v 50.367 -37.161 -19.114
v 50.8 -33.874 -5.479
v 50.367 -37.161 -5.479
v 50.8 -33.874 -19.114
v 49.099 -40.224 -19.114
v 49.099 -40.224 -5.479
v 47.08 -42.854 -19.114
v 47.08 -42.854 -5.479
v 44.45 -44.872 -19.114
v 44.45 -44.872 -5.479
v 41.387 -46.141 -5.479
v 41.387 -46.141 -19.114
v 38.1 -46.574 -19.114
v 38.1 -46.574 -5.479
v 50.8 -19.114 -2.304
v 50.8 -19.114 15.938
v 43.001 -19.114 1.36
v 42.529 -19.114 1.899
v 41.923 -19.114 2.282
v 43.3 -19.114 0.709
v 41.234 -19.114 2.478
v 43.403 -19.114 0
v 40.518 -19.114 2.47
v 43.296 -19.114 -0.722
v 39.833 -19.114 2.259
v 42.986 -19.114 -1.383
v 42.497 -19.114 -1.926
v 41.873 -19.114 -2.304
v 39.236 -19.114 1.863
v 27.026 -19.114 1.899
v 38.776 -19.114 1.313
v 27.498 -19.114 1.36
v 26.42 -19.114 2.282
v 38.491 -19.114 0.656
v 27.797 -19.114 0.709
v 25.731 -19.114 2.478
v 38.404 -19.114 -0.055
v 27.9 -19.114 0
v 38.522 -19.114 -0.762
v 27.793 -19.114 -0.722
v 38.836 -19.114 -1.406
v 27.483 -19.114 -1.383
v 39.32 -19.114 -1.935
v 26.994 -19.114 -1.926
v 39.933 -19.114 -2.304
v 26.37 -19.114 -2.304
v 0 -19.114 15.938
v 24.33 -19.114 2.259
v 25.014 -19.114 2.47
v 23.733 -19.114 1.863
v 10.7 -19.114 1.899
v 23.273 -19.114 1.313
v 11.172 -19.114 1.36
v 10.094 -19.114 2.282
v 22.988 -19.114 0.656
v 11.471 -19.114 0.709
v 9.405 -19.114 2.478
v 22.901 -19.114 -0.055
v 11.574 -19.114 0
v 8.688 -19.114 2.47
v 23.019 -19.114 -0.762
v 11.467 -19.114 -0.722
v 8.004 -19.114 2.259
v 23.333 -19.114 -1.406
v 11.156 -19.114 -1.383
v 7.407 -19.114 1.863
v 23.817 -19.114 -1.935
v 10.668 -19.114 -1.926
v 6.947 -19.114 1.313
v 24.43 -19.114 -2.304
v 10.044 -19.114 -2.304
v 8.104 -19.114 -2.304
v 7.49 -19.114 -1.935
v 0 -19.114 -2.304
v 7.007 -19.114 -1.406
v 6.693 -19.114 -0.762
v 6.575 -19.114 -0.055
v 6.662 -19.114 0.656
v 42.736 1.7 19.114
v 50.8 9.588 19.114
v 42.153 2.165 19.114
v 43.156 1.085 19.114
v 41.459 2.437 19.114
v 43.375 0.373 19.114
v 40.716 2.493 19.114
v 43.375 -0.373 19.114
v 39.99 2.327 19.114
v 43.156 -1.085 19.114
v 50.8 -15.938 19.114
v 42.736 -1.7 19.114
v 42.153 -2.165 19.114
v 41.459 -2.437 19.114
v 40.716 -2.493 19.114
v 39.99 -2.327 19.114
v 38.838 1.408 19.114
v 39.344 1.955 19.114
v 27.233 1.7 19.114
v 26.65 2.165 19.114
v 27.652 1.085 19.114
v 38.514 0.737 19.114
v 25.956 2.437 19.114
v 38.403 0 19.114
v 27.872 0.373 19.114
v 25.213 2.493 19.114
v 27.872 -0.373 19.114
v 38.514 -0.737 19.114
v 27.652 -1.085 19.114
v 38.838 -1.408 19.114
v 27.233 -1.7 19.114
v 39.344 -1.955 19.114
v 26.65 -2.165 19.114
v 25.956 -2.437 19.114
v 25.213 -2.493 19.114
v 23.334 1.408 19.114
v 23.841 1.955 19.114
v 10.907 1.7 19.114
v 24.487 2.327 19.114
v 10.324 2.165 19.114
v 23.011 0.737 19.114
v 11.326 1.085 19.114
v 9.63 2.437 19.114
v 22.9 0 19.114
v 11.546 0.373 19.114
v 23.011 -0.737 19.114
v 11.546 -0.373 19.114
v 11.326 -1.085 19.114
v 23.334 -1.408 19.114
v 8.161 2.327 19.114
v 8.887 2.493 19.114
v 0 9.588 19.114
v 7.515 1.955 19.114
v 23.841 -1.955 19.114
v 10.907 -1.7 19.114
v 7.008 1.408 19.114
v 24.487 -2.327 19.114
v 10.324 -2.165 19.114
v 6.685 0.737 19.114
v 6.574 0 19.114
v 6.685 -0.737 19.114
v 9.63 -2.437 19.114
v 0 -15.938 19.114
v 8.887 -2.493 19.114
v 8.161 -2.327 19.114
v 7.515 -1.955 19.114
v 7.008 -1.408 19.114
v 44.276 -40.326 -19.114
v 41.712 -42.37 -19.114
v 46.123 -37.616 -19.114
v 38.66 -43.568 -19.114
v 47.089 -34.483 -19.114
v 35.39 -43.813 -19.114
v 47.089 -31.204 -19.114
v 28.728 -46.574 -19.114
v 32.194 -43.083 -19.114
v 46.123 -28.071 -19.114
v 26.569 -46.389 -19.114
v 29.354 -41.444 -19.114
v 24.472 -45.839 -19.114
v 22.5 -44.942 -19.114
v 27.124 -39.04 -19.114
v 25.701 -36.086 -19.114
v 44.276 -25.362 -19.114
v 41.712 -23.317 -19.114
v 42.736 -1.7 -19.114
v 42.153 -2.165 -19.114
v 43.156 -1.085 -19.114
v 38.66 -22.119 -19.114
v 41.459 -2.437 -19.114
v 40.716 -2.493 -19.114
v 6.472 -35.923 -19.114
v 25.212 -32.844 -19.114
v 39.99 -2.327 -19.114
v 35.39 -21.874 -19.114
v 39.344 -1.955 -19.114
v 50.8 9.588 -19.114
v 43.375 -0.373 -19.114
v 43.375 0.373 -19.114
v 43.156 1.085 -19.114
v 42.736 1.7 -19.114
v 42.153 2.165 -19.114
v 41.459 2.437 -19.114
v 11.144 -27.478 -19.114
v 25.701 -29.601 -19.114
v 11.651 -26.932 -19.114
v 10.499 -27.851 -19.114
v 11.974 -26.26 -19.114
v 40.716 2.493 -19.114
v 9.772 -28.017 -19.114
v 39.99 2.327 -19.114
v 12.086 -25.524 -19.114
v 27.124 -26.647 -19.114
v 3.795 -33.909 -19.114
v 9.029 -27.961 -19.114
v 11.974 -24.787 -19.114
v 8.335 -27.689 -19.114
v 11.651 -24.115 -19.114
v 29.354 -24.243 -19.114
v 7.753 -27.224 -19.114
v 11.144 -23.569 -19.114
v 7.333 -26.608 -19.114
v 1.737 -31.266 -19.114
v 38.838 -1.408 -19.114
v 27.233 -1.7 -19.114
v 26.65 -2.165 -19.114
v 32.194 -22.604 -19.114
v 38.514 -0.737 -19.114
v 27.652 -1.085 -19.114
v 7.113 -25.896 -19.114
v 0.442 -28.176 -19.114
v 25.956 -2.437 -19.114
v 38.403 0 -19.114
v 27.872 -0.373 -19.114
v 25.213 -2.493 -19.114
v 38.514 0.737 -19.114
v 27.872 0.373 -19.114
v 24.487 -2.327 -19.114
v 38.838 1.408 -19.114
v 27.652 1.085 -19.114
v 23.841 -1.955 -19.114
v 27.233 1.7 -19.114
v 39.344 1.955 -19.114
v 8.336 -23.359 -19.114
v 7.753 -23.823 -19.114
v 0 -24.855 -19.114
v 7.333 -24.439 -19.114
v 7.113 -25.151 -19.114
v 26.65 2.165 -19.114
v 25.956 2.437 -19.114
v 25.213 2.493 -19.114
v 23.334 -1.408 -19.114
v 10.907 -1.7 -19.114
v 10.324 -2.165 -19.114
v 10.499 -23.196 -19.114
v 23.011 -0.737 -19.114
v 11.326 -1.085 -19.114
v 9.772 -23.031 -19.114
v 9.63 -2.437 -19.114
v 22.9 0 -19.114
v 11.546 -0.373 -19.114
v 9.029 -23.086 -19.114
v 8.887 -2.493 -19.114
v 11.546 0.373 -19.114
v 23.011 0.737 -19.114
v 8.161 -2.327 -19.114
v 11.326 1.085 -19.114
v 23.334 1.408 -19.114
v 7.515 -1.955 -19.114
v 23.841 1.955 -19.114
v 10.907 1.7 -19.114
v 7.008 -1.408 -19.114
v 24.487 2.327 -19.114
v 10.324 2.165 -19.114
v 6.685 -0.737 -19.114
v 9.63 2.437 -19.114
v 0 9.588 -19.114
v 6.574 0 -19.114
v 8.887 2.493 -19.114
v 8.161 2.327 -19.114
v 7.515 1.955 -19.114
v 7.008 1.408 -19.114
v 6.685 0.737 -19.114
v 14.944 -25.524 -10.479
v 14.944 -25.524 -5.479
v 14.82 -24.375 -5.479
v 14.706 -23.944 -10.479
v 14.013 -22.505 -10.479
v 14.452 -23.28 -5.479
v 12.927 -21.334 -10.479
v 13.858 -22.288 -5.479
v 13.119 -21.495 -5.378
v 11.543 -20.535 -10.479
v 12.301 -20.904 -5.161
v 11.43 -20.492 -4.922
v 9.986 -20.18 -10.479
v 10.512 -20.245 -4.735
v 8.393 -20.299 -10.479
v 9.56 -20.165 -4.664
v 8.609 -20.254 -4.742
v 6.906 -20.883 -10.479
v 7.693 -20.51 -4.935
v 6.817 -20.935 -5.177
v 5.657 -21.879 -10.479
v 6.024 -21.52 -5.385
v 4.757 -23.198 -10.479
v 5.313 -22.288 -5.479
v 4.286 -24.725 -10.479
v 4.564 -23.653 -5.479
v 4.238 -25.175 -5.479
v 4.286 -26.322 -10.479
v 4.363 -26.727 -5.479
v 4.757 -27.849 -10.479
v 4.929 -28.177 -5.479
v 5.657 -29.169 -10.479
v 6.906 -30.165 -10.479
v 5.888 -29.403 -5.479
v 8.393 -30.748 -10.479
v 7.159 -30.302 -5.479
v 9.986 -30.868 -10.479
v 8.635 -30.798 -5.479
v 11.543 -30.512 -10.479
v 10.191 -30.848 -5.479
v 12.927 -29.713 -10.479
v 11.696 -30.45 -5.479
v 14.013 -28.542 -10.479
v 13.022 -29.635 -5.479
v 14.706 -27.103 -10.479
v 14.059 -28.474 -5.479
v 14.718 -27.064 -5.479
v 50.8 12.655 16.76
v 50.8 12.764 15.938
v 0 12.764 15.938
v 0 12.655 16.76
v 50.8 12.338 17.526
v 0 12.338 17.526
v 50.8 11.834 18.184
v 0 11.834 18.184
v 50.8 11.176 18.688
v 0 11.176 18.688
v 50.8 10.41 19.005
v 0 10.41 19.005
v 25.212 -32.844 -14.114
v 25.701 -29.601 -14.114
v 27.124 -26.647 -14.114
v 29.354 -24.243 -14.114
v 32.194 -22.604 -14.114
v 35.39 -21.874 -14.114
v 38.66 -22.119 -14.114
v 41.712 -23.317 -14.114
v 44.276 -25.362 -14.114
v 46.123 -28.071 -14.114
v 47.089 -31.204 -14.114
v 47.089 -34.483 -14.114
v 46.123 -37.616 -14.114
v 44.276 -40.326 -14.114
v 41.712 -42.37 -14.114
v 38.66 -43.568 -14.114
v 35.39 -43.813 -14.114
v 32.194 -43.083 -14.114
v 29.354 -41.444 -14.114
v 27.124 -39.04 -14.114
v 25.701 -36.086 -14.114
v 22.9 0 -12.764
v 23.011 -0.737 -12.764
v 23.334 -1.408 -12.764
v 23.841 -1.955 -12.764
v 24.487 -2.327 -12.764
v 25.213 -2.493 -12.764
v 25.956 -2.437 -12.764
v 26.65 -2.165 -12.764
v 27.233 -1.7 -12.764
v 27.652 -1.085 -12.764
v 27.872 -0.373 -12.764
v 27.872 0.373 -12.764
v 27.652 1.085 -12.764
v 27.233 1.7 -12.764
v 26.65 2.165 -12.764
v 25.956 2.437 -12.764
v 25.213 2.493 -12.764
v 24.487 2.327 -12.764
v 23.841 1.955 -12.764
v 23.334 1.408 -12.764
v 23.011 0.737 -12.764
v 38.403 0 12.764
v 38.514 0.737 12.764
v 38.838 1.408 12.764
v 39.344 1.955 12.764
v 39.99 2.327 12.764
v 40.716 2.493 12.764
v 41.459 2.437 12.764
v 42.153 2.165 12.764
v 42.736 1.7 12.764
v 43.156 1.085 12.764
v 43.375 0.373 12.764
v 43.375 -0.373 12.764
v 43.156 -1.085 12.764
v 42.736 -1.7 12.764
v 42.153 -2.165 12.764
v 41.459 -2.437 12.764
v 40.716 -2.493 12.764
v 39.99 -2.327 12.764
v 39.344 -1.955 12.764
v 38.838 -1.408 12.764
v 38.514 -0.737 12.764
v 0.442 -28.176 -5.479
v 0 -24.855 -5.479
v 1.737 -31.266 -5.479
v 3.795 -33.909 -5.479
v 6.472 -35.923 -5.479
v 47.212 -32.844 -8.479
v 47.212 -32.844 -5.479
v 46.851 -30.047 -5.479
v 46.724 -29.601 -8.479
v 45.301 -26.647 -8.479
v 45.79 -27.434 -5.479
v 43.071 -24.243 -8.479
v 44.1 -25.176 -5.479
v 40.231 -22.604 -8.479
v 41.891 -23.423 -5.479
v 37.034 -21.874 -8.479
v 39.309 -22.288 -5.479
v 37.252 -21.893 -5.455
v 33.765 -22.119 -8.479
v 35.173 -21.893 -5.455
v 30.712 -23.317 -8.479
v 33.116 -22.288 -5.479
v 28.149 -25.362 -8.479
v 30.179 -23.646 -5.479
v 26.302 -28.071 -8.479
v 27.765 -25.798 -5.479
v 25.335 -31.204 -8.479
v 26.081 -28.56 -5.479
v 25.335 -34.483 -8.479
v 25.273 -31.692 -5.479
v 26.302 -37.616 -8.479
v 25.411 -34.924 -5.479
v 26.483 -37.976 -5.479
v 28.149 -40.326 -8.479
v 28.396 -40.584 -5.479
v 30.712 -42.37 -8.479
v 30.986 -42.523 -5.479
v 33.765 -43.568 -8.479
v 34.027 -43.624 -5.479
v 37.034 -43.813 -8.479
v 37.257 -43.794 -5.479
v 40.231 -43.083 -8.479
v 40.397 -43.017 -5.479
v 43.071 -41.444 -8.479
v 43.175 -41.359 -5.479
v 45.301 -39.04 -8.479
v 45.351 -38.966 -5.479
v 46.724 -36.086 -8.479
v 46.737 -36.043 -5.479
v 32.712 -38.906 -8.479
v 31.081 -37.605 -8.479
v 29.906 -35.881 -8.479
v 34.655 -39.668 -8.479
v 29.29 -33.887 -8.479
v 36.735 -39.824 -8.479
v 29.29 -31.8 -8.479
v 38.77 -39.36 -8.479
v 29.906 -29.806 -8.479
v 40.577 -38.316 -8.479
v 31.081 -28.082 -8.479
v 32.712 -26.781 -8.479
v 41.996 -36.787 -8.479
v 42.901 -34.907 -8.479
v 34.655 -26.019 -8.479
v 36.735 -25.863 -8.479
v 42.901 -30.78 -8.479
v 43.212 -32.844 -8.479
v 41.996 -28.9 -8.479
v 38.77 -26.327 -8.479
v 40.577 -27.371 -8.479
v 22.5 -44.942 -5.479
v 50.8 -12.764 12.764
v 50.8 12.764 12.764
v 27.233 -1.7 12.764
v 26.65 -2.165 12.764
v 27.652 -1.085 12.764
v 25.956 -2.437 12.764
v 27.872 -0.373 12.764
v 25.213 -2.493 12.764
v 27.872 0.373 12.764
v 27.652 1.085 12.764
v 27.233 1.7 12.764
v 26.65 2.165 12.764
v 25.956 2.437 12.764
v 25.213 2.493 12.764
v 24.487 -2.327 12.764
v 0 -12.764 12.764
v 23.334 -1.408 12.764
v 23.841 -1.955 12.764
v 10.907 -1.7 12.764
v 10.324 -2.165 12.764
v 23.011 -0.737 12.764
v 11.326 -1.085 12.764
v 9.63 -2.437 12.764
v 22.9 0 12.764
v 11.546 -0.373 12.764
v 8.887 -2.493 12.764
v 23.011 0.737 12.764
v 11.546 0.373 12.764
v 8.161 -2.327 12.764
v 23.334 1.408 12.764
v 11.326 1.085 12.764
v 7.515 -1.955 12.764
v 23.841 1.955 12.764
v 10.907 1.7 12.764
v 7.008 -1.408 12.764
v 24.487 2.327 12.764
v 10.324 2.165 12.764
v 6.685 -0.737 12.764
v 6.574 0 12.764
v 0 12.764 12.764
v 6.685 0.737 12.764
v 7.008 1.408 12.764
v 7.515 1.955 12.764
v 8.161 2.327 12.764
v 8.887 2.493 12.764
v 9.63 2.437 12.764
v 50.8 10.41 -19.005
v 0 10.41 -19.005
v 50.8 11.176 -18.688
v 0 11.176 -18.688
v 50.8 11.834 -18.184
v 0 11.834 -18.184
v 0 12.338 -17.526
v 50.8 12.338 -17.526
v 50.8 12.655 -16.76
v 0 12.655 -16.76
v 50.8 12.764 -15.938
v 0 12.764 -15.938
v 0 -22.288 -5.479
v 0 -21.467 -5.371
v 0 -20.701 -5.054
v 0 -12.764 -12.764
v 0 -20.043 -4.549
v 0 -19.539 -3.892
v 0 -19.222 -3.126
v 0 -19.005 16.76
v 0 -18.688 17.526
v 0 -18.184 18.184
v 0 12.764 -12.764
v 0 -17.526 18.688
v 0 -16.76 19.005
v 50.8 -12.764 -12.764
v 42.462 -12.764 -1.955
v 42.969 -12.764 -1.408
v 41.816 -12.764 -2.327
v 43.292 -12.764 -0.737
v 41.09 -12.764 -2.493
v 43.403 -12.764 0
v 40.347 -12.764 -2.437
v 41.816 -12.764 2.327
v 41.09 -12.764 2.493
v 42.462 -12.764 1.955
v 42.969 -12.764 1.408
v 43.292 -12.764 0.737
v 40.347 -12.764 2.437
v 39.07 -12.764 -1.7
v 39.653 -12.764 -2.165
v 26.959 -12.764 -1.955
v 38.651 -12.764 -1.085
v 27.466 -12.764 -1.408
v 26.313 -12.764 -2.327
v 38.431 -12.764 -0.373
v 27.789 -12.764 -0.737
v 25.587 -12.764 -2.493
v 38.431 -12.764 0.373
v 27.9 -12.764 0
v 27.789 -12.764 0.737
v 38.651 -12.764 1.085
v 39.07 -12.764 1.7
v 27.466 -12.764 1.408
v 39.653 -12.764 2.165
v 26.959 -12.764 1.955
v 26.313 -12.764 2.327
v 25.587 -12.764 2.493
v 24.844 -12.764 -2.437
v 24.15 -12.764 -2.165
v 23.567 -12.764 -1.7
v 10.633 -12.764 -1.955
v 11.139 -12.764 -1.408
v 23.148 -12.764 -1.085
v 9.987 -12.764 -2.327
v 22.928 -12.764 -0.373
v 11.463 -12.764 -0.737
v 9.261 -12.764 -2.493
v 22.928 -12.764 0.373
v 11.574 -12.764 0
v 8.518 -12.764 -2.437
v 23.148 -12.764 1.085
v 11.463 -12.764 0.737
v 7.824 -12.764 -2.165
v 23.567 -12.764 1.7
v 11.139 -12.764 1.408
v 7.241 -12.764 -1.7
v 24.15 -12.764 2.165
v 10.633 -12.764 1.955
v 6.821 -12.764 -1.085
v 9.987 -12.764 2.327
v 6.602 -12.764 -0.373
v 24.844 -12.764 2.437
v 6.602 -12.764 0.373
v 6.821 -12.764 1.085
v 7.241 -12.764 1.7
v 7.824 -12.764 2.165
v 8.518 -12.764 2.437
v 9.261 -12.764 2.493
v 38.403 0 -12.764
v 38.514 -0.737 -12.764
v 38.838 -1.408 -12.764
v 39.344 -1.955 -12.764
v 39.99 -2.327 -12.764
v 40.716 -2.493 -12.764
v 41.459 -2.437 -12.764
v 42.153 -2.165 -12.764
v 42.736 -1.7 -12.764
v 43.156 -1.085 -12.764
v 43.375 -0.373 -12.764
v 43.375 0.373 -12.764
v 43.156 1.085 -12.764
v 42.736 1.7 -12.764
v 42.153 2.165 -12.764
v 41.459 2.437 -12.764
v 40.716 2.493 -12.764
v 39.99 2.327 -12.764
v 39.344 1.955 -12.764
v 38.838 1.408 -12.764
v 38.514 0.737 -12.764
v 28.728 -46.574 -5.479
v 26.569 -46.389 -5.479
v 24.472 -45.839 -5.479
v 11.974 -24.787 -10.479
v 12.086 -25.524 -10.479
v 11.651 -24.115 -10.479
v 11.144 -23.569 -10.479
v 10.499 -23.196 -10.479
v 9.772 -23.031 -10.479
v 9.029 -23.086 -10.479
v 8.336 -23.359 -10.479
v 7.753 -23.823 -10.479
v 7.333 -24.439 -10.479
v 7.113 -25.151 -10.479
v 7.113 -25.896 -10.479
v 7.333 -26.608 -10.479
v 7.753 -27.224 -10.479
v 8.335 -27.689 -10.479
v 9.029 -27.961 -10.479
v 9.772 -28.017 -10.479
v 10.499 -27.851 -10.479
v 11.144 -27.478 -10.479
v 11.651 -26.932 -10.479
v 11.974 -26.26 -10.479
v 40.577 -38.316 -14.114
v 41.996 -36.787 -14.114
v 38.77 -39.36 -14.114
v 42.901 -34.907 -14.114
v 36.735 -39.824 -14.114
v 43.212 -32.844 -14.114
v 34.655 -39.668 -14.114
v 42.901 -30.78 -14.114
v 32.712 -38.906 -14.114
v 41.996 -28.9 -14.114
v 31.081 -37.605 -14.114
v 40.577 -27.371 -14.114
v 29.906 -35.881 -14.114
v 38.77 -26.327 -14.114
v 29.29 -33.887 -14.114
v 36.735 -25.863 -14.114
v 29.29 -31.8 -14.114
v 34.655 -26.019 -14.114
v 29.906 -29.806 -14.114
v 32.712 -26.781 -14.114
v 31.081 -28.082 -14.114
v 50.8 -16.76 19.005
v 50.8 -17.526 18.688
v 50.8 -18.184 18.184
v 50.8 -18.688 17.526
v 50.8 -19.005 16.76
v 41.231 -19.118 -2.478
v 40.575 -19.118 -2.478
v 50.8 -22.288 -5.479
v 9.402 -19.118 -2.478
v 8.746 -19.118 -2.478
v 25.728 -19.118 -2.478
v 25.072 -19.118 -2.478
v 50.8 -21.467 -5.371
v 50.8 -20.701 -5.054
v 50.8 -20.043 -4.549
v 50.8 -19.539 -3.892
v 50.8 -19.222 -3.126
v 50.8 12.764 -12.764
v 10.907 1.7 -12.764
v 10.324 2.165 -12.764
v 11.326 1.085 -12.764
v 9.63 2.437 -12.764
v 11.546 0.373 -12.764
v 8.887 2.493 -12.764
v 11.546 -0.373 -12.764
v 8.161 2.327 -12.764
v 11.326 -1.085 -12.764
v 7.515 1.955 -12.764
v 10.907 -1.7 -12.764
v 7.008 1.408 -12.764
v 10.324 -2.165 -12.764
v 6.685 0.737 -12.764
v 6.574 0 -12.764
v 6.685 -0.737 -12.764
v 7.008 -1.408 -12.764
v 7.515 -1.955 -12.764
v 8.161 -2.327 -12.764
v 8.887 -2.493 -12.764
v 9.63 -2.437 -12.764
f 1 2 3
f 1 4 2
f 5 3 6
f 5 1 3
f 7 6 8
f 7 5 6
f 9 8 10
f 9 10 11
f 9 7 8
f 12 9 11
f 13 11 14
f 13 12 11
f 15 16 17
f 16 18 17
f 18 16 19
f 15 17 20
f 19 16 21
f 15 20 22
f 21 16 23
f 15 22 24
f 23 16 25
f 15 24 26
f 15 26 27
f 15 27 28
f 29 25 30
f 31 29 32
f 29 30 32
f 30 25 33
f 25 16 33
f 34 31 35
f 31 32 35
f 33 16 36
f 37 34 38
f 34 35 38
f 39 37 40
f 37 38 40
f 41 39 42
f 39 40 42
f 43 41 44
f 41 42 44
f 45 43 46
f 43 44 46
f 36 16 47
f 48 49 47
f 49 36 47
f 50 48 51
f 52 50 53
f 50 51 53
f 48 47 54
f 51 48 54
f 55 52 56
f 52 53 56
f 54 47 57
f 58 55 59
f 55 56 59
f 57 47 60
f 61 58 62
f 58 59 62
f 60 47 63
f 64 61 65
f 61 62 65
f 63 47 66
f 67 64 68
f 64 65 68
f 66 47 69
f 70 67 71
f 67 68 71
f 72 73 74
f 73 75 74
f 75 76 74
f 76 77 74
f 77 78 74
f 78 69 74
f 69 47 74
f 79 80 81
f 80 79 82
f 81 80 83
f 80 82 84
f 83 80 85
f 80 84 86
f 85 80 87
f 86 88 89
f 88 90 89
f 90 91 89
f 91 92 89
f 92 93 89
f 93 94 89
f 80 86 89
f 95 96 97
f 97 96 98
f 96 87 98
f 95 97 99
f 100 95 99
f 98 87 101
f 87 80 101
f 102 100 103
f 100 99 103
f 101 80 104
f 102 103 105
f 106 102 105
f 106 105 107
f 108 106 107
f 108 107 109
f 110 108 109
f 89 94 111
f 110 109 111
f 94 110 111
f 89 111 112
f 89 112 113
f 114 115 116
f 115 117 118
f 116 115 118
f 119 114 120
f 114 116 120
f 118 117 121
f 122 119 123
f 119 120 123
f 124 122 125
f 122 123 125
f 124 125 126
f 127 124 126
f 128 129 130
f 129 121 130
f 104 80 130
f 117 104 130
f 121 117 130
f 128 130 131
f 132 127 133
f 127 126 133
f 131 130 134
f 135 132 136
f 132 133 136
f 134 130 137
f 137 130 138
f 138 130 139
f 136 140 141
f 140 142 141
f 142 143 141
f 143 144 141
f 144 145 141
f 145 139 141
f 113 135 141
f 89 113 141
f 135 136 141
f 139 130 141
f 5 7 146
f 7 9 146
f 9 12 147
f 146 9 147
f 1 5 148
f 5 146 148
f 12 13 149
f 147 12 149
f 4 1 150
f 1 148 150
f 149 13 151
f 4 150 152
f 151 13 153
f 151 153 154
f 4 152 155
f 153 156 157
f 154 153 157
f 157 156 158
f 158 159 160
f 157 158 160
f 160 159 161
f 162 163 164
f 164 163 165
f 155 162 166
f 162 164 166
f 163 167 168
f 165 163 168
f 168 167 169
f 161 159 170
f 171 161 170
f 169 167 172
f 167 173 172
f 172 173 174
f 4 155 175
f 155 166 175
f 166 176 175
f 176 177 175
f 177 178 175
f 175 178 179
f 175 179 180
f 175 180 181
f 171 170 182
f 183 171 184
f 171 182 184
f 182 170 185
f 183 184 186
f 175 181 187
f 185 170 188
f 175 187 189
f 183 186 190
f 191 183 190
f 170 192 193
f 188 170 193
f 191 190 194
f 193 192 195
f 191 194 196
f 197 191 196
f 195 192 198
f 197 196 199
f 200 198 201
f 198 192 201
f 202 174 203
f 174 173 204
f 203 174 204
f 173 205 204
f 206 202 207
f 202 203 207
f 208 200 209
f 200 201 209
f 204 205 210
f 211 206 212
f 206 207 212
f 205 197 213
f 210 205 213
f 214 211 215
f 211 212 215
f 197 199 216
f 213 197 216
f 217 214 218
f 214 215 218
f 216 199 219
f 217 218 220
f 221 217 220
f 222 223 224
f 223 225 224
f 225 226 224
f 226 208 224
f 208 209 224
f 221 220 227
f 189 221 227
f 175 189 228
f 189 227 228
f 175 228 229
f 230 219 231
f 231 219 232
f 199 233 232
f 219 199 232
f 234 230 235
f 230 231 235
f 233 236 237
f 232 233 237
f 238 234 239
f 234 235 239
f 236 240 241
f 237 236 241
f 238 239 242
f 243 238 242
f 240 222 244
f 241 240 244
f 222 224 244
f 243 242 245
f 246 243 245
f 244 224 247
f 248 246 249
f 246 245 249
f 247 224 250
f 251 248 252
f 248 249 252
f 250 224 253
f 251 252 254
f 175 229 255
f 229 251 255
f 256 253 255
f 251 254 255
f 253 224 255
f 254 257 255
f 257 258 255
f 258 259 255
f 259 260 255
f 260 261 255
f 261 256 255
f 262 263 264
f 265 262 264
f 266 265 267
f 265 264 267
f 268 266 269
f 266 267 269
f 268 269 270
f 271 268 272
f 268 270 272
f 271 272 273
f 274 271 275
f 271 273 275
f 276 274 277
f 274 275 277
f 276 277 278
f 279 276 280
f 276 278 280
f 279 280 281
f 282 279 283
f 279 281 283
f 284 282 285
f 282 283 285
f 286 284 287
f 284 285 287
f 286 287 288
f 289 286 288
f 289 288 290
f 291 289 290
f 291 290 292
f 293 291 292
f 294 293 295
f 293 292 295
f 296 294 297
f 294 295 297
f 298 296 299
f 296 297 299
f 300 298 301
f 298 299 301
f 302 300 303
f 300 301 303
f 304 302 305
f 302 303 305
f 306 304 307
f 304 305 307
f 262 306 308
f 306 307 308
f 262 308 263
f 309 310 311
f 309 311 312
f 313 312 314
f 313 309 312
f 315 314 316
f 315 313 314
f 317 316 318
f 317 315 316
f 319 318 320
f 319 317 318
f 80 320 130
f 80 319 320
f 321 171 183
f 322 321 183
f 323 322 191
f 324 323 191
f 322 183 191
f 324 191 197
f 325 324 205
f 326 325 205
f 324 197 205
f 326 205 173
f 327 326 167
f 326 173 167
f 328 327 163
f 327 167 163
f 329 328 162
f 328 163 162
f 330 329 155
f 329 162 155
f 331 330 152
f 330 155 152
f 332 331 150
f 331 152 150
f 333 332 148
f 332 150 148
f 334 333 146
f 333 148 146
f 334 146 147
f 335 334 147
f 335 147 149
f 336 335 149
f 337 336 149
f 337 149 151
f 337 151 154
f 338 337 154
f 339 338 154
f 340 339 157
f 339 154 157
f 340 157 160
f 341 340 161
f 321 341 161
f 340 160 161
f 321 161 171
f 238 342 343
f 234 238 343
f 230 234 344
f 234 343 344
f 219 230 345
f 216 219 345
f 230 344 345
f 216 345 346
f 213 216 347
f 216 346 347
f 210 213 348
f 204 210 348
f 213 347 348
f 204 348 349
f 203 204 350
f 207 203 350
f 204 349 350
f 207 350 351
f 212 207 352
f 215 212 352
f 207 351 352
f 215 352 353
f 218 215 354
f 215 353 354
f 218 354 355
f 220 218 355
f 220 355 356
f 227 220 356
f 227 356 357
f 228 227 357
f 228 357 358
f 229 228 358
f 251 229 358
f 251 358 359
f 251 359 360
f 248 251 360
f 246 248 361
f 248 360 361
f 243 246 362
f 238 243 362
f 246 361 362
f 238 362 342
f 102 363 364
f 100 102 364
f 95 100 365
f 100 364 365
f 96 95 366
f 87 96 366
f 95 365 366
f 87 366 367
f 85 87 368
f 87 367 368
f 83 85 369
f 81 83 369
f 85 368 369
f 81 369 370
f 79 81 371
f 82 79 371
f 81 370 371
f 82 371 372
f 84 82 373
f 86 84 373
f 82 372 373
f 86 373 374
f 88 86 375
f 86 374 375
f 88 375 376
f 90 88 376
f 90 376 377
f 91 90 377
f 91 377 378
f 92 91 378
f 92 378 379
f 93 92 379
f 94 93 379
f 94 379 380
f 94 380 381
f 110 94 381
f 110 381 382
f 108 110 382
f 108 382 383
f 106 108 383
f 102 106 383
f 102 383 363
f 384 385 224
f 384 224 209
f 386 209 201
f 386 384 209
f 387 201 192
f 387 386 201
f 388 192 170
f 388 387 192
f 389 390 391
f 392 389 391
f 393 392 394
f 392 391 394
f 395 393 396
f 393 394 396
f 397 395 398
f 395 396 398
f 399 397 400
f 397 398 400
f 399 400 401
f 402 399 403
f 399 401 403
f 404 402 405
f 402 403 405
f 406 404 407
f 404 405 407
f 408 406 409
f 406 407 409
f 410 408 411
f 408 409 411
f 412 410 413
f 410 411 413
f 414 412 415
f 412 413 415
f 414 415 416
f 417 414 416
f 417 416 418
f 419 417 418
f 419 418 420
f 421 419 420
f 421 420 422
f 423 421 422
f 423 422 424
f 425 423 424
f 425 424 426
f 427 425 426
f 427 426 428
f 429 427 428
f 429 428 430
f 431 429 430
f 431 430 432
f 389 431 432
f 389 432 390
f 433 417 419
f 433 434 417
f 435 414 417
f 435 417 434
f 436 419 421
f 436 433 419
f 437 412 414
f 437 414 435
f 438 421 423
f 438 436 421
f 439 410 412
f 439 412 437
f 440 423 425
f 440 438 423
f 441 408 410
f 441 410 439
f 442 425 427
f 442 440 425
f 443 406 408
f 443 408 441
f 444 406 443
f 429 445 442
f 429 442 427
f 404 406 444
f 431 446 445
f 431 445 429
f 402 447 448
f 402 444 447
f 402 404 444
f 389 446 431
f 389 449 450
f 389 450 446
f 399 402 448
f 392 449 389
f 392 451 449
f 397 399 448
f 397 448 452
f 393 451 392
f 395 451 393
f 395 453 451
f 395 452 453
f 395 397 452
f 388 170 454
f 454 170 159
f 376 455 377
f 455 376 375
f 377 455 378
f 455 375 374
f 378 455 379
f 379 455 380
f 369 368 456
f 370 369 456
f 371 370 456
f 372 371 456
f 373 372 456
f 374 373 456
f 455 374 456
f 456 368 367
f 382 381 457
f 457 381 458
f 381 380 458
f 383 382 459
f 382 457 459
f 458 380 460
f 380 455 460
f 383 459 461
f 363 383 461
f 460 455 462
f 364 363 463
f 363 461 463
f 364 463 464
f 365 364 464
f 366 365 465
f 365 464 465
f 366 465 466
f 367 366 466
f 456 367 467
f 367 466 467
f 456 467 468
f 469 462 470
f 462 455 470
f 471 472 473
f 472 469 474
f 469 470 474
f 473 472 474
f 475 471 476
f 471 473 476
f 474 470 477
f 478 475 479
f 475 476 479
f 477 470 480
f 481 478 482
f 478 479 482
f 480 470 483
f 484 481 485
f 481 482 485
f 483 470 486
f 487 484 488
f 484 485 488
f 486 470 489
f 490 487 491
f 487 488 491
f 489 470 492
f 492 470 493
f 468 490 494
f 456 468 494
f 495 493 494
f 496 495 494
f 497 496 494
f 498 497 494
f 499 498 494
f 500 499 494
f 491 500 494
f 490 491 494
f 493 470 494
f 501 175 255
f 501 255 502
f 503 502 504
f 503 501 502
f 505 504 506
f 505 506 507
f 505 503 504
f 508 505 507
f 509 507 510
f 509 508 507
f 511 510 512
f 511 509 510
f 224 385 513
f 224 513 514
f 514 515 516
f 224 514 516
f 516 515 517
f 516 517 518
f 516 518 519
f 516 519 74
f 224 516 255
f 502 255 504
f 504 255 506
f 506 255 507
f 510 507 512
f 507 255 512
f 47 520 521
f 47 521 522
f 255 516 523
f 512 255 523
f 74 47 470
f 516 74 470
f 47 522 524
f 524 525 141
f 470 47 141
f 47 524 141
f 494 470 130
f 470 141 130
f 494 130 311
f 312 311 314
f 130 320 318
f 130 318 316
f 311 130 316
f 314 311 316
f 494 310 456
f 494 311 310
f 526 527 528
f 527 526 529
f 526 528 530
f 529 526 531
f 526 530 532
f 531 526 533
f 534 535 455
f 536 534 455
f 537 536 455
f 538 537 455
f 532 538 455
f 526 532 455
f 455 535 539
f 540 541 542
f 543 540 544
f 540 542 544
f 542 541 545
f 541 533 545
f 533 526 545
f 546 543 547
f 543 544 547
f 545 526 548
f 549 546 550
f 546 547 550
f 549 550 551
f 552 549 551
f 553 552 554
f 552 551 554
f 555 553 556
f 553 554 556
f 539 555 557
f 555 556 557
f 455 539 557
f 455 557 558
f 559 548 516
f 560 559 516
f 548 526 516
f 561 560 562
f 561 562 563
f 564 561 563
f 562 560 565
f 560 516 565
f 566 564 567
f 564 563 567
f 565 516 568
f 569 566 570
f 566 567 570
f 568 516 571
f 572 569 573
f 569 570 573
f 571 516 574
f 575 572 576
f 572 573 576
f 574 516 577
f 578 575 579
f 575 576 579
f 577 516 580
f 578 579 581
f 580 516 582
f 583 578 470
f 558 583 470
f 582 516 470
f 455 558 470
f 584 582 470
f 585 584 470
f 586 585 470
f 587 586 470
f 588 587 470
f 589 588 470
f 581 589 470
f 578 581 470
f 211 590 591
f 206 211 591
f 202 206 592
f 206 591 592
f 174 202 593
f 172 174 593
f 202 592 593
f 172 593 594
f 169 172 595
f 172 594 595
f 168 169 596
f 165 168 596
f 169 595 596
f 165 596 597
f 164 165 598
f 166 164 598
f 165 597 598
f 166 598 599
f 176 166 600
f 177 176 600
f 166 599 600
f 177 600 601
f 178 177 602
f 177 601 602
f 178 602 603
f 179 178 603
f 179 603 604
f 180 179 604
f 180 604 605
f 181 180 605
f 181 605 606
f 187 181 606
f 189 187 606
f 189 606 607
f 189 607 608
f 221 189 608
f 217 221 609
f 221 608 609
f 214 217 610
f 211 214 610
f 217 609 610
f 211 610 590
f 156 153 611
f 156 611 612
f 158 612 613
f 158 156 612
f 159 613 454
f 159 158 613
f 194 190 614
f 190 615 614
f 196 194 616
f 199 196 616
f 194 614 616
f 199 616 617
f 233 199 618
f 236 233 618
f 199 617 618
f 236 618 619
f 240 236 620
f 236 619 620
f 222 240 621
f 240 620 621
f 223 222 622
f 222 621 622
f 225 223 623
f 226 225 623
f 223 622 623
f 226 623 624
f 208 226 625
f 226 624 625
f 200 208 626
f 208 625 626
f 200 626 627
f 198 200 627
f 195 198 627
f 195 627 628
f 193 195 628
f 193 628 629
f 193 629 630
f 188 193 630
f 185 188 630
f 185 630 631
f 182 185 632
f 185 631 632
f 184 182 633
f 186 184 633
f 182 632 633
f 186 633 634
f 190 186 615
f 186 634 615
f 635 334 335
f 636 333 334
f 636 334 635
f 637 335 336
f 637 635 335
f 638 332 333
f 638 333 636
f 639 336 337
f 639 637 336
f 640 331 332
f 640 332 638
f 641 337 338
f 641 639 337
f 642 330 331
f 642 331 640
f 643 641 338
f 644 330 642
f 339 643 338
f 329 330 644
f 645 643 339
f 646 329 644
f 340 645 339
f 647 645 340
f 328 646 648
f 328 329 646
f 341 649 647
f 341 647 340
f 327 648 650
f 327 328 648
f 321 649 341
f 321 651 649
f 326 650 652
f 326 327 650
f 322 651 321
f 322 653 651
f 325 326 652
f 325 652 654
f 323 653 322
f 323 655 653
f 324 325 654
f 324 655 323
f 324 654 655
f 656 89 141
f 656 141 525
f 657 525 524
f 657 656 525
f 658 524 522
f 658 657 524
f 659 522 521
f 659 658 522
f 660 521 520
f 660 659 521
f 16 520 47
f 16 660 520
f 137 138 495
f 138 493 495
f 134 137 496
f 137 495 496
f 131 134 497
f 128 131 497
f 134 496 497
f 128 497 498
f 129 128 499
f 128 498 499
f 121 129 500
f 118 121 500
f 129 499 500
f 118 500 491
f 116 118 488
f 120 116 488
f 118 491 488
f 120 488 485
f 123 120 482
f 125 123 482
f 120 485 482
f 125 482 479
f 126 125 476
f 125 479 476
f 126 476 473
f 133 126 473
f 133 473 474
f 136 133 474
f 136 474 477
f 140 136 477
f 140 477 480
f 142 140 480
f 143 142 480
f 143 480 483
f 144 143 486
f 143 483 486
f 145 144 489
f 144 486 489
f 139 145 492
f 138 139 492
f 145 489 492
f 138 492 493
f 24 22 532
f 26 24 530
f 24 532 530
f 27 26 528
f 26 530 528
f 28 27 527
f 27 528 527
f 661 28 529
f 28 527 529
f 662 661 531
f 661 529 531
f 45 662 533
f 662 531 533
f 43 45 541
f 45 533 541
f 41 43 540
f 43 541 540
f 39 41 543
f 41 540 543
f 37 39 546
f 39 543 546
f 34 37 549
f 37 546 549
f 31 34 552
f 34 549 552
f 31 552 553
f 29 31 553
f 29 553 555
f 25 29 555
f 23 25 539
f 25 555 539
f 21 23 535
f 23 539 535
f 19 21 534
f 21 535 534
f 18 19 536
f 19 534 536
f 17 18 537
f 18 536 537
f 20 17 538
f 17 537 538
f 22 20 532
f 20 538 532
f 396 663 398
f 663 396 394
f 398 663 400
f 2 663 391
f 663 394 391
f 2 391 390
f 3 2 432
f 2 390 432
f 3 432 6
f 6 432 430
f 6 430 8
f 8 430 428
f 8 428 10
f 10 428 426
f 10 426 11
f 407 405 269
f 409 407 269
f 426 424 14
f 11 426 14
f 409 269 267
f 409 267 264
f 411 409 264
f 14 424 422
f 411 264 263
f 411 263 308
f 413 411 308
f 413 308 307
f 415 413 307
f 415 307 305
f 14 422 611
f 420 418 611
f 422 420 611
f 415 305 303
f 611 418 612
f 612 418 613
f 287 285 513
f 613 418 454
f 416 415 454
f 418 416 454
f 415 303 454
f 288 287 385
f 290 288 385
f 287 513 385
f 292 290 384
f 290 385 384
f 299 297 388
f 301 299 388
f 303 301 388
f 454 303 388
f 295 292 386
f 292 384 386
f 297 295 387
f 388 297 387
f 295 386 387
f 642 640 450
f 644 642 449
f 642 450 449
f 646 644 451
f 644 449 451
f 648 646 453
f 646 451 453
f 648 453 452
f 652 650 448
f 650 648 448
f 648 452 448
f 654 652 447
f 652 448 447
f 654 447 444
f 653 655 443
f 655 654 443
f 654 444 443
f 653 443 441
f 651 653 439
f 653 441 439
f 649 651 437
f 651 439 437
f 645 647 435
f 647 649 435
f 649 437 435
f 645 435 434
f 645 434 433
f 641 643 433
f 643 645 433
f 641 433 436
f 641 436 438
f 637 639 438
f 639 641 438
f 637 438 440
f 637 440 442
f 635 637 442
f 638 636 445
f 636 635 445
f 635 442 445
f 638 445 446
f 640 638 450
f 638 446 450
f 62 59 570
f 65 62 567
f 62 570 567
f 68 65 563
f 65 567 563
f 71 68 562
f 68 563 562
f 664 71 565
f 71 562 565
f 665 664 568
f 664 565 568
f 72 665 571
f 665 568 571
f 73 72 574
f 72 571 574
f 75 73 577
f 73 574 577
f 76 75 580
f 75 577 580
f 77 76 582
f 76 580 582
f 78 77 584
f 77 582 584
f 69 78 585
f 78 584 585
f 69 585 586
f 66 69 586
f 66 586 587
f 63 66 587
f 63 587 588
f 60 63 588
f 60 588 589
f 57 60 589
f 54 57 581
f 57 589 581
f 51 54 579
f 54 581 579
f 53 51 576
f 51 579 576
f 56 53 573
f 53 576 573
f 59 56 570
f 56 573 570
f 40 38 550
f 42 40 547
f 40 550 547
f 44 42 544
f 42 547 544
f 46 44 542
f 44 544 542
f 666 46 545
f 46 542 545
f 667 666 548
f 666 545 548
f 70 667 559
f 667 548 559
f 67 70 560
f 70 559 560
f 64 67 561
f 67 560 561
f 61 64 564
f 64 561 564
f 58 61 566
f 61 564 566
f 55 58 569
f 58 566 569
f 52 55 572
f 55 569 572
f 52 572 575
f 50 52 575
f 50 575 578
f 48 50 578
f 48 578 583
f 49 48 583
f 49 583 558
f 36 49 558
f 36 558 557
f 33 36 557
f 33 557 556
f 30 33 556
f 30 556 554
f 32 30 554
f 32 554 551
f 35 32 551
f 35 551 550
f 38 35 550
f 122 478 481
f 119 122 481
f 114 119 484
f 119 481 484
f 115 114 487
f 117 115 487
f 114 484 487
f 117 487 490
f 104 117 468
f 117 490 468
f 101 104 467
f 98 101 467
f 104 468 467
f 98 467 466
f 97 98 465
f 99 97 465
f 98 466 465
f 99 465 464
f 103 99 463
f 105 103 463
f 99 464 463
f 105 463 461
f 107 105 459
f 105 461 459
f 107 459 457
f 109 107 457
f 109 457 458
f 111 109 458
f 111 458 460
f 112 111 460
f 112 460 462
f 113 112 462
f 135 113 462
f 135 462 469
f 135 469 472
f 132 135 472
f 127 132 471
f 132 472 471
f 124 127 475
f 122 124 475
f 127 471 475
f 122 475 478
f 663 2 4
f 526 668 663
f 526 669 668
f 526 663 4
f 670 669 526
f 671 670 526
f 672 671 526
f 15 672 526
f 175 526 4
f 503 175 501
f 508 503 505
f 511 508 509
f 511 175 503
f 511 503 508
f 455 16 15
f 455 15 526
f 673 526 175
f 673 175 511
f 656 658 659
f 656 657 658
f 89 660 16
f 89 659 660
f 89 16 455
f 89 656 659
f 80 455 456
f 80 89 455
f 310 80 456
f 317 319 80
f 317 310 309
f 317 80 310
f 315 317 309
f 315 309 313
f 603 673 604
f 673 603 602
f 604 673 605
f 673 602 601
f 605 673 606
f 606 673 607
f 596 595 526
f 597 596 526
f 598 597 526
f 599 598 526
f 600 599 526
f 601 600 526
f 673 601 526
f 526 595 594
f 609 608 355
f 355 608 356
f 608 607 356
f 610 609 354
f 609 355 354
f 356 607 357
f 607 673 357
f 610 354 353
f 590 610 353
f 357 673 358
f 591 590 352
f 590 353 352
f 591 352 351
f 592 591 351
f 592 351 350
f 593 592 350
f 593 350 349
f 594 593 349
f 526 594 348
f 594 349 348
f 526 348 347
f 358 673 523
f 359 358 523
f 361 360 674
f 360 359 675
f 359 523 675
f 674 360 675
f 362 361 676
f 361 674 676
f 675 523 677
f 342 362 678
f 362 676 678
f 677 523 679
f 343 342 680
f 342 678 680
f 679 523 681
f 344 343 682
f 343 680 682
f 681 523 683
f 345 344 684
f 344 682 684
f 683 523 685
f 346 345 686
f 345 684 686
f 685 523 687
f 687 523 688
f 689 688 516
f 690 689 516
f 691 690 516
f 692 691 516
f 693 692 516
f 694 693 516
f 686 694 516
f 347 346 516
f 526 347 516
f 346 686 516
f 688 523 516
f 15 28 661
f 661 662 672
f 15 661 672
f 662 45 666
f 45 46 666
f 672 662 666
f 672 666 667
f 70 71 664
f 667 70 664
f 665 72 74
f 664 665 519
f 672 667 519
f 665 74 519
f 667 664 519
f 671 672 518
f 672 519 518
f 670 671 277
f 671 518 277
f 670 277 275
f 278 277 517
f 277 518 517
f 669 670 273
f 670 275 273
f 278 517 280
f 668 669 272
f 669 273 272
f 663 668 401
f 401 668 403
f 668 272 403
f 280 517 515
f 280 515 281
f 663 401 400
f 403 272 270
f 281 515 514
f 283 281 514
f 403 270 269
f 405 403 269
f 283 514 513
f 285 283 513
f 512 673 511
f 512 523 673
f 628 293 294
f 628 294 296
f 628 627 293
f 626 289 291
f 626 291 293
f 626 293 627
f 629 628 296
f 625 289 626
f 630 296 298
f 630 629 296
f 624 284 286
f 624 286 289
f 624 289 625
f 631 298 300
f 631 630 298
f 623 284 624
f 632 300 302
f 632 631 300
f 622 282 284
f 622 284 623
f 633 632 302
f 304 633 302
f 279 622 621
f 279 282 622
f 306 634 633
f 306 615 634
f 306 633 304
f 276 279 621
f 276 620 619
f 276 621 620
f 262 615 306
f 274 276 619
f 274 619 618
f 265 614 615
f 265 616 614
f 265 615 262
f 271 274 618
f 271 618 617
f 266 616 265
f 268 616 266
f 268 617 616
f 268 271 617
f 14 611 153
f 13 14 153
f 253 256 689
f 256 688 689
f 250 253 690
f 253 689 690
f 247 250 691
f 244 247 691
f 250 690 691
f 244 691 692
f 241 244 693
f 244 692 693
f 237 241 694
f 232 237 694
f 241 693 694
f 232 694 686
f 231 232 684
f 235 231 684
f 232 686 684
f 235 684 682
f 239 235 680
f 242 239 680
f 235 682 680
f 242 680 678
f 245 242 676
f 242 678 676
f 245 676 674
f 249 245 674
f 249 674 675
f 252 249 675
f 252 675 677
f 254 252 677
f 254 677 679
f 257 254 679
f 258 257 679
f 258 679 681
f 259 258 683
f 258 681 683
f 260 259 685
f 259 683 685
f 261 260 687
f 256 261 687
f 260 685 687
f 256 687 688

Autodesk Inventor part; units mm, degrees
ref_plane "YZ Plane" through (0, 0, 0) normal (1, 0, 0) x (0, 1, 0)
ref_plane "XZ Plane" through (0, 0, 0) normal (0, 1, 0) x (-1, 0, 0)
ref_plane "XY Plane" through (0, 0, 0) normal (0, 0, 1) x (1, 0, 0)
sketch "Sketch1" plane through (0, 0, 0) normal (1, 0, 0) x (0, 1, 0)
  line L0 (-12.7635, 12.7635) -> (12.7635, 12.7635)
  line L1 (12.7635, 12.7635) -> (12.7635, -12.7635)
  line L2 (12.7635, -12.7635) -> (-12.7635, -12.7635)
  line L3 (-12.7635, -12.7635) -> (-12.7635, 12.7635)
  line L4 (-12.7635, 12.7635) -> (12.7635, -12.7635) construction
  line L5 (12.7635, 12.7635) -> (-12.7635, -12.7635) construction
  line L6 (19.1135, 19.1135) -> (-19.1135, 19.1135)
  line L7 (-19.1135, 19.1135) -> (-19.1135, -19.1135)
  line L8 (-19.1135, -19.1135) -> (19.1135, -19.1135)
  line L9 (19.1135, -19.1135) -> (19.1135, 19.1135)
  line L10 (12.7635, 19.1135) -> (12.7635, -19.1135)
  line L11 (-19.1135, -5.4793) -> (-46.5737, -5.4793)
  line L12 (-46.5737, -5.4793) -> (-46.5737, -19.1135)
  line L13 (-46.5737, -19.1135) -> (-19.1135, -19.1135)
  line L14 (-19.1135, -19.1135) -> (-19.1135, -5.4793)
  point P0 (0, 0)
  point P1 (12.7635, 12.7635)
  dimension "d1" = 25.527
  dimension "d2" = 6.35
extrude "Extrusion1" add sketch "Sketch1" along normal blind 50.8 contours L3 L2 L10 L8 L7 L6 L0 | L13 L12 L11 L7
sketch "Sketch2" plane through (0, -46.5737, -5.4793) normal (0, 0, 1) x (1, 0, 0)
  line L0 (0, 27.4602) -> (0, 0) projected
  line L1 (0, 0) -> (50.8, 0) projected
  line L2 (50.8, 27.4602) -> (50.8, 0) projected
  line L3 (0, 27.4602) -> (50.8, 27.4602) projected
  circle A0 centre (36.2123, 13.7301) radius 7
  point P0 (0, 46.5737)
  dimension "d5" = 14
extrude "Extrusion2" cut sketch "Sketch2" against normal through all contours A0
sketch "Sketch3" plane through (0, -46.5737, -19.1135) normal (0, 0, -1) x (-1, 0, 0)
  circle A0 centre (-36.2123, 13.7301) radius 7 projected
  circle A1 centre (-36.2123, 13.7301) radius 11
  point P0 (0, 46.5737)
  dimension "d8" = 22
extrude "Extrusion3" cut sketch "Sketch3" against normal blind 5
sketch "Sketch4" plane through (0, -12.7635, 12.7635) normal (0, 1, 0) x (1, 0, 0)
  line L0 (0, 25.527) -> (0, 0) projected
  line L1 (0, 0) -> (50.8, 0) projected
  line L2 (50.8, 25.527) -> (50.8, 0) projected
  line L3 (0, 25.527) -> (50.8, 25.527) projected
  line L4 (0, 12.7635) -> (50.8, 12.7635) construction
  circle A0 centre (9.0739, 12.7635) radius 2.5
  circle A1 centre (25.4, 12.7635) radius 2.5
  circle A2 centre (40.9031, 12.7635) radius 2.5
  dimension "d11" = 5
  dimension "d12" = 5
  dimension "d13" = 5
extrude "Extrusion4" cut sketch "Sketch4" against normal through all contours A0 | A1 | A2
sketch "Sketch5" plane through (0, -12.7635, 12.7635) normal (0, 0, -1) x (-1, 0, 0)
  line L0 (-43.4031, 0) -> (-38.4031, 0) projected
  line L1 (-27.9, 0) -> (-22.9, 0) projected
  line L2 (-11.5739, 0) -> (-6.5739, 0) projected
  line L3 (0, 0) -> (0, 25.527) projected
  line L4 (0, 25.527) -> (-50.8, 25.527) projected
  line L5 (-50.8, 0) -> (-50.8, 25.527) projected
  line L6 (0, 0) -> (-50.8, 0) projected
  circle A0 centre (-9.0739, 12.7635) radius 2.5
  circle A1 centre (-25.4, 12.7635) radius 2.5
  circle A2 centre (-40.9031, 12.7635) radius 2.5
  point P0 (0, 12.7635)
  dimension "d16" = 5
extrude "Extrusion5" cut sketch "Sketch5" along normal through all both and the other way through all contours A0 | A1 | A2
sketch "Sketch7" plane through (0, -46.5737, -5.4793) normal (0, 0, 1) x (1, 0, 0)
  circle A0 centre (36.2123, 13.7301) radius 7 projected
  circle A1 centre (36.2123, 13.7301) radius 11
  point P0 (0, 46.5737)
  dimension "d21" = 22
extrude "Extrusion7" cut sketch "Sketch7" against normal blind 3
sketch "Sketch8" plane through (0, -46.5737, -5.4793) normal (0, 0, 1) x (1, 0, 0)
  line L0 (0, 27.4602) -> (0, 0) projected
  circle A0 centre (36.2123, 13.7301) radius 11 projected
  line L1 (0, 27.4602) -> (0, 0) projected
  line L2 (0, 0) -> (50.8, 0) projected
  line L3 (50.8, 27.4602) -> (50.8, 0) projected
  line L4 (0, 27.4602) -> (50.8, 27.4602) projected
  circle A1 centre (9.5855, 21.0501) radius 2.5
  line L5 (0, 0) -> (0, 59.3372) projected
  line L6 (0, 14.2925) -> (25.4, 0)
  point P0 (0, 46.5737)
  point P1 (0, 14.2925)
  dimension "d24" = 5
extrude "Extrusion8" cut sketch "Sketch8" along normal through all both and the other way through all contours L6 L2 L0 | A1
fillet "Fillet1" radius 12.7 3 edges at (0, -32.2813, -12.2964) (50.8, -46.5737, -12.2964) (25.4, -46.5737, -12.2964)
sketch "Sketch9" plane through (0, -19.1135, -5.4793) normal (0, 0, 1) x (1, 0, 0)
  circle A0 centre (9.5855, -6.4101) radius 2.5 projected
  circle A1 centre (36.2123, -13.7301) radius 11 projected
  arc A2 (22.4998, -25.8283) -> (28.7278, -27.4602) centre (28.7278, -14.7602) ccw projected
  line L0 (28.7278, -27.4602) -> (38.1, -27.4602) projected
  arc A3 (38.1, -27.4602) -> (50.8, -14.7602) centre (38.1, -14.7602) ccw projected
  line L1 (50.8, 0) -> (50.8, -14.7602) projected
  line L2 (0, 0) -> (50.8, 0) projected
  line L3 (0, 0) -> (0, -5.7415) projected
  arc A4 (0, -5.7415) -> (6.472, -16.8095) centre (12.7, -5.7415) ccw projected
  line L4 (6.472, -16.8095) -> (22.4998, -25.8283) projected
  circle A5 centre (9.5855, -6.4101) radius 5.3589
  point P0 (0, 19.1135)
extrude "Extrusion9" cut sketch "Sketch9" against normal blind 5 contours A5
fillet "Fillet2" radius 3.175 1 edges at (25.4, -19.1135, -5.4793)
fillet "Fillet3" radius 3.175 3 edges at (25.4, -19.1135, 19.1135) (25.4, 12.7635, 19.1135) (25.4, 12.7635, -19.1135)
properties part number "swingarmBase"
